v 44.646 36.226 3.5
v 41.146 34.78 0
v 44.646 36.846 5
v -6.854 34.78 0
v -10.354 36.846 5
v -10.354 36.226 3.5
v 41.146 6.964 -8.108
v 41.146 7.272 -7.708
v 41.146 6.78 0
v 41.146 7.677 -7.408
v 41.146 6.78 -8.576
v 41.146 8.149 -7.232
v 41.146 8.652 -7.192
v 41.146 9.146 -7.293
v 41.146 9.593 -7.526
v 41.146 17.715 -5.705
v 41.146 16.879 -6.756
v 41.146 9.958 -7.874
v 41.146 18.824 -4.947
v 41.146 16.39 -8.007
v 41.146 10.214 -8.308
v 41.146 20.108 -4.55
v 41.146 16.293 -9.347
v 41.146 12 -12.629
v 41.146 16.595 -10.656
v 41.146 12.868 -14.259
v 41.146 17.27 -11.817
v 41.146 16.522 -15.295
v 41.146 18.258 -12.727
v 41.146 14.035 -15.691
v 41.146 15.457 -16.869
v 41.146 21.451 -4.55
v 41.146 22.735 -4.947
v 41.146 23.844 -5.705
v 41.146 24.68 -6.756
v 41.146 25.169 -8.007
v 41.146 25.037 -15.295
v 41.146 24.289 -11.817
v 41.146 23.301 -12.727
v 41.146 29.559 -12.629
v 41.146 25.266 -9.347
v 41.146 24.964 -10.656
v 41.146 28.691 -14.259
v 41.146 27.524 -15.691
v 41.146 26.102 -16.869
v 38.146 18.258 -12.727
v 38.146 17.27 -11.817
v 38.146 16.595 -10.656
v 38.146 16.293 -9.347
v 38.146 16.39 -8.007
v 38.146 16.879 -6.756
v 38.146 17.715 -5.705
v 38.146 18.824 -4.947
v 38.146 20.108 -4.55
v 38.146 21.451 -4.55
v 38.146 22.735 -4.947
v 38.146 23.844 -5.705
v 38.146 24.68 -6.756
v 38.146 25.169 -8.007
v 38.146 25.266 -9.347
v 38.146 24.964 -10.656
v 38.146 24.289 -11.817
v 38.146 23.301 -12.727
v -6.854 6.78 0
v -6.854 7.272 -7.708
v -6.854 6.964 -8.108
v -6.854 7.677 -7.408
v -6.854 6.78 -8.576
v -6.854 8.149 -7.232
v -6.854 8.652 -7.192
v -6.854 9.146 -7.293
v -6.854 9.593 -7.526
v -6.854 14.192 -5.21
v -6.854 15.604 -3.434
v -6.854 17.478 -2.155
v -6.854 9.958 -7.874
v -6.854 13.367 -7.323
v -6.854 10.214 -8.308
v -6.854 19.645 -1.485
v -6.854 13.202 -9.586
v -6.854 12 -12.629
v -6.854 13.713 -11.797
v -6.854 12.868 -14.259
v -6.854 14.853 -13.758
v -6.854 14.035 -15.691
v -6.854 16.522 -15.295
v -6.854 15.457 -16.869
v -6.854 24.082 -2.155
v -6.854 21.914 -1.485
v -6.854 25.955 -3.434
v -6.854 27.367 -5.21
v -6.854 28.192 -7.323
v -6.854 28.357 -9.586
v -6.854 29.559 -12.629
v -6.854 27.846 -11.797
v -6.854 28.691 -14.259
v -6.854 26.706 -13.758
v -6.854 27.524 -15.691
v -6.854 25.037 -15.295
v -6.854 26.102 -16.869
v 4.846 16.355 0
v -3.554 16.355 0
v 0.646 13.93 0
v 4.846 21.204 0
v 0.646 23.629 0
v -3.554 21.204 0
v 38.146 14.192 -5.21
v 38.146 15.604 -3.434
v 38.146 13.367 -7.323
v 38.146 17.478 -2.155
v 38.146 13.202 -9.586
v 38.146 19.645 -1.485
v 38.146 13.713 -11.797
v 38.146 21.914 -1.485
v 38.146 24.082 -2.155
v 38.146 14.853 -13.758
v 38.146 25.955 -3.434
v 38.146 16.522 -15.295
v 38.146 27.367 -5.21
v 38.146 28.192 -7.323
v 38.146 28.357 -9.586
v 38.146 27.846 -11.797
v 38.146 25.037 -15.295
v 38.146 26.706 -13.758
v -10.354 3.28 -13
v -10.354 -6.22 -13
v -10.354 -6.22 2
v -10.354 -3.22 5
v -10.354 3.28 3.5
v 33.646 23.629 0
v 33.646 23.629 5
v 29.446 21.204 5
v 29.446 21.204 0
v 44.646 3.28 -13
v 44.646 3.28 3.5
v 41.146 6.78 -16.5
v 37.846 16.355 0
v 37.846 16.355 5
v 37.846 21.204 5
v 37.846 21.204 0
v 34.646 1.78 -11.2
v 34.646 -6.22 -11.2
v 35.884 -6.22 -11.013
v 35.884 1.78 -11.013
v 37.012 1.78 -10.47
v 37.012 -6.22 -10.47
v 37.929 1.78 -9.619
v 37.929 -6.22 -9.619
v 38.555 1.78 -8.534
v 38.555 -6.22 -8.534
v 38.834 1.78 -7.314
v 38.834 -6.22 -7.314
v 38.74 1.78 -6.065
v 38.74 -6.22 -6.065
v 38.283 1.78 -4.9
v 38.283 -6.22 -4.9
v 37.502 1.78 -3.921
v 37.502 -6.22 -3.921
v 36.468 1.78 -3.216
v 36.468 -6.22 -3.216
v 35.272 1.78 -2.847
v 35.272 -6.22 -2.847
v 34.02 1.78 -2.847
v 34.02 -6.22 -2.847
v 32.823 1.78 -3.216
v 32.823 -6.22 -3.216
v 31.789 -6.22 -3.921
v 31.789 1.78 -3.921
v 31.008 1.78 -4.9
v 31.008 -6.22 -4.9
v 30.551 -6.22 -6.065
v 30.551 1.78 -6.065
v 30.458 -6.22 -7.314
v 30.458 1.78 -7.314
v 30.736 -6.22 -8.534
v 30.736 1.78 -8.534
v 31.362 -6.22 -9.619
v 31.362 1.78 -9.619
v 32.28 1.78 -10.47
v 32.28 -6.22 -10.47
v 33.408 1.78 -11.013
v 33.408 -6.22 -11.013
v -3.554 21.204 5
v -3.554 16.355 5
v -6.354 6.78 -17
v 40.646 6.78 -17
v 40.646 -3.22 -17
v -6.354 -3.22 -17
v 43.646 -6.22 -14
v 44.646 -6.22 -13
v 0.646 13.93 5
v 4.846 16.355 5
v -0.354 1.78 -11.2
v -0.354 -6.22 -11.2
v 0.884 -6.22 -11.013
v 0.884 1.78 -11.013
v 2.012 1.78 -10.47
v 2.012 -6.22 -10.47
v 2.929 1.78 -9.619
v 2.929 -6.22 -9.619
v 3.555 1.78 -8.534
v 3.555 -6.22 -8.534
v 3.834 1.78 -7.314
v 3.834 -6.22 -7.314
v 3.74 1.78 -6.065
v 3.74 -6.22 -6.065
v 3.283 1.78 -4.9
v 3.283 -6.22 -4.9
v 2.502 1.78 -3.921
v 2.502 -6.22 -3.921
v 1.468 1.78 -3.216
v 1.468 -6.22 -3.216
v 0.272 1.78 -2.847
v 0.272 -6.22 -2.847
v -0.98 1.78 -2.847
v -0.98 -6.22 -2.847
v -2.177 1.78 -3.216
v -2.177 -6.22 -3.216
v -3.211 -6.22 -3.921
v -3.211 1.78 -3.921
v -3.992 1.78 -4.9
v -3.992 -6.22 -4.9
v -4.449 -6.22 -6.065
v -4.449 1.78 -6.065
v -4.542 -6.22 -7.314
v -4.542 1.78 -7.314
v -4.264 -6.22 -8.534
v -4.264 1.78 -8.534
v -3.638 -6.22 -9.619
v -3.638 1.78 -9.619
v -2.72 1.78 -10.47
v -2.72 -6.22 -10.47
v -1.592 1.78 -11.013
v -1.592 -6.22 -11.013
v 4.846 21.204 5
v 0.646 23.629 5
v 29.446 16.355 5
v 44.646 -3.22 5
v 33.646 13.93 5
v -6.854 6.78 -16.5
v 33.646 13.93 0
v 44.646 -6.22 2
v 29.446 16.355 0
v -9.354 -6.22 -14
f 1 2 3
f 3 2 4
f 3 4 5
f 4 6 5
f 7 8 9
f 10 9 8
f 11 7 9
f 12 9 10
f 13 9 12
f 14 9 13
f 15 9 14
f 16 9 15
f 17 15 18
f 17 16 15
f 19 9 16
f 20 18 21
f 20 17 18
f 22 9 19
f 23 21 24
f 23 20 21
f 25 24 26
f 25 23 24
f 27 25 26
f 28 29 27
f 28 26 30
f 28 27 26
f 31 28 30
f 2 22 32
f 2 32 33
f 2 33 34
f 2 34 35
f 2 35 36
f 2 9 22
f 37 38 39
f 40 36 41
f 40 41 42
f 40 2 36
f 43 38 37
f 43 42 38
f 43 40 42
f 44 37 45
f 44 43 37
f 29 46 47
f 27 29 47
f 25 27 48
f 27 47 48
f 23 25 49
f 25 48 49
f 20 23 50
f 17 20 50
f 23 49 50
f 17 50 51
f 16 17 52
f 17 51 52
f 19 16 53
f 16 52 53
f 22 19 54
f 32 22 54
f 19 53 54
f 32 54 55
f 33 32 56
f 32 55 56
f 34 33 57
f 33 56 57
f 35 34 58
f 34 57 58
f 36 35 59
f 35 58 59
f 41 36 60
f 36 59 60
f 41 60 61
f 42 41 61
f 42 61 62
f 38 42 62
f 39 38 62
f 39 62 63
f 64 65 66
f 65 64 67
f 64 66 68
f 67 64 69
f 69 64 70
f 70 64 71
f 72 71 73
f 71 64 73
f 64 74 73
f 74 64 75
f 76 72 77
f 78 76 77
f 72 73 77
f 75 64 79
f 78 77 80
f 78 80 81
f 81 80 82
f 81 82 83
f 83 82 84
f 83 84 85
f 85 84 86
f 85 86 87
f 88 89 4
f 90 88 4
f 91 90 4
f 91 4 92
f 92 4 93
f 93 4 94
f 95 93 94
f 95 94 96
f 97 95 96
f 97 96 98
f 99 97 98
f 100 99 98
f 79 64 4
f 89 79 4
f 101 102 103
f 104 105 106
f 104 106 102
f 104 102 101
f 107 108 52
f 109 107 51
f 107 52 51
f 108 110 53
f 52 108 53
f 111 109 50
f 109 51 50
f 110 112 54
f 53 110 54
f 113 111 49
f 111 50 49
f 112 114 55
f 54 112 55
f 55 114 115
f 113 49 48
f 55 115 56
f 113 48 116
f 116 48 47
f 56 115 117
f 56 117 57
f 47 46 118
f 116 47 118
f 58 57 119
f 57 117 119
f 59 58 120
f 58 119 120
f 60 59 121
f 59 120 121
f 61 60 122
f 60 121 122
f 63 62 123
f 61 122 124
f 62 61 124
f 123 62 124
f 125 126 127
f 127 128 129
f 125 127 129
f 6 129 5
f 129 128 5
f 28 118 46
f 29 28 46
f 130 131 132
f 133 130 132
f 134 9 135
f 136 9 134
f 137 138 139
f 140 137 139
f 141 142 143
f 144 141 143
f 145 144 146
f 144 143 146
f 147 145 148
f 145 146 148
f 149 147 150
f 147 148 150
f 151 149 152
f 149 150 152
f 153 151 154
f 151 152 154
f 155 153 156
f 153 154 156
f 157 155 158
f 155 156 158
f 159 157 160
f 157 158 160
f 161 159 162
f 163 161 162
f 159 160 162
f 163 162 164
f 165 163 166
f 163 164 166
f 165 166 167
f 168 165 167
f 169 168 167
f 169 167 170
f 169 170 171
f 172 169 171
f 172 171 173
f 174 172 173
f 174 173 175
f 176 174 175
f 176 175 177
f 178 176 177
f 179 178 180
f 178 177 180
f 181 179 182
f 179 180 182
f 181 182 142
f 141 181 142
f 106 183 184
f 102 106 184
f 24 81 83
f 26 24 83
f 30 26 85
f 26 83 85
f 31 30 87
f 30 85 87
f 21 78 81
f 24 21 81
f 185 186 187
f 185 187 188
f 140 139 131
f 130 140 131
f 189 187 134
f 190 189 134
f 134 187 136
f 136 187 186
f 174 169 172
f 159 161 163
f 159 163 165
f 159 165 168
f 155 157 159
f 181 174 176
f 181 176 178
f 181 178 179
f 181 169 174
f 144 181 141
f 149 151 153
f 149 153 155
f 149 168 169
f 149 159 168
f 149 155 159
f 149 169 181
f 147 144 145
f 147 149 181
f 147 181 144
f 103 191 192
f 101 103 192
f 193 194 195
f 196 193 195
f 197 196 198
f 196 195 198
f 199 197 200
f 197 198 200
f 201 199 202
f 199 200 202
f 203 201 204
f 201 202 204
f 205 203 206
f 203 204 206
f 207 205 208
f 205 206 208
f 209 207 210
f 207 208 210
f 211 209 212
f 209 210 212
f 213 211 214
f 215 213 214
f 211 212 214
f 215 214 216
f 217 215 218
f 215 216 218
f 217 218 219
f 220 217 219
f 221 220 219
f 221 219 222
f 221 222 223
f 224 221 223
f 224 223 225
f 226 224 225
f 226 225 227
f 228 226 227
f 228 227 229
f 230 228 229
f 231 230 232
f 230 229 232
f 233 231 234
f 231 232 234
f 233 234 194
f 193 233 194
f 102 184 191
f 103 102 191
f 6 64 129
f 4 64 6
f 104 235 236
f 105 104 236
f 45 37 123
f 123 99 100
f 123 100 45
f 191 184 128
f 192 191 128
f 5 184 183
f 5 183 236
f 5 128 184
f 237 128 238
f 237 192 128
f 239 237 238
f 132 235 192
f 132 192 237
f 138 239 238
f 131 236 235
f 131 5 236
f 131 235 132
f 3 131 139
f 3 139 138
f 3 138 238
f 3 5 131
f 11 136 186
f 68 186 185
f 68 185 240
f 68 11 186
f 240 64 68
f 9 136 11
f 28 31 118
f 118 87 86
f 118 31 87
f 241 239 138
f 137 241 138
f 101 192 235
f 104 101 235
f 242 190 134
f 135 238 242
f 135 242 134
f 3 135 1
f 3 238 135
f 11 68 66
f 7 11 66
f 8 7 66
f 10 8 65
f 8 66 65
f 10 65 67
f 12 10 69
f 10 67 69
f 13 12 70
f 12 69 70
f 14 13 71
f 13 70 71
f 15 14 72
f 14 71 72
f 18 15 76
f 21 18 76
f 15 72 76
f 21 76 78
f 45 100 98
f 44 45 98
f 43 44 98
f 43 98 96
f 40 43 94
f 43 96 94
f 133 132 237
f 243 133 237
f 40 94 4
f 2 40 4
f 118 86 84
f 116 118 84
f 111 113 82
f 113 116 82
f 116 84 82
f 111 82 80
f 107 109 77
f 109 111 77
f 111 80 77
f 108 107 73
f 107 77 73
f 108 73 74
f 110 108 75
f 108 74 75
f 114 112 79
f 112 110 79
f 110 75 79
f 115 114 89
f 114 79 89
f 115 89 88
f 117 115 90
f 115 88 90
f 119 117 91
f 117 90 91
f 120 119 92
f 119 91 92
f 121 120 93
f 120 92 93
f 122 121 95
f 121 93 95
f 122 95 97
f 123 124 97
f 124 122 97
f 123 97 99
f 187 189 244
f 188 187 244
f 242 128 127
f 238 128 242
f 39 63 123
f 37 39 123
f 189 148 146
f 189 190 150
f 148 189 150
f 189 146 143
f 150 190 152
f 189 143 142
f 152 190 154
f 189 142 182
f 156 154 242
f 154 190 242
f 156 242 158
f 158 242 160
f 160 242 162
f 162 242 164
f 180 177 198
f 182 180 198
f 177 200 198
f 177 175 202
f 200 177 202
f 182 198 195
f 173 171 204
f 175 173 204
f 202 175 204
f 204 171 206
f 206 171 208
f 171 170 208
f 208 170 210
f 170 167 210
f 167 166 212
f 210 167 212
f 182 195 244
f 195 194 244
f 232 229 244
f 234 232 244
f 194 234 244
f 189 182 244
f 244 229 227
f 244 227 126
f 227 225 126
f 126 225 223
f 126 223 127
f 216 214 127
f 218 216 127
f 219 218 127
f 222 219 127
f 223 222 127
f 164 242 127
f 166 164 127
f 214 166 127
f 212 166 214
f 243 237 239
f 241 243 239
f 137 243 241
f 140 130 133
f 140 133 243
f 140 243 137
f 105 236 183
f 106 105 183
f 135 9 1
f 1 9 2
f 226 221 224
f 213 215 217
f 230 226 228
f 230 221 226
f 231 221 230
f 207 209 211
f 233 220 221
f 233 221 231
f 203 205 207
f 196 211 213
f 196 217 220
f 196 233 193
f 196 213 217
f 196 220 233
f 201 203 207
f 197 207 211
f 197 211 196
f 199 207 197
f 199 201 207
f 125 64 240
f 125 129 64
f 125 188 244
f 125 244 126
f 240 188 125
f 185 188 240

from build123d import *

# Parameters (mm, degrees)
SKETCH1_W           = 55
SKETCH1_H           = 45
BOSS_EXTRUDE1_DEPTH = 5
SKETCH3_W           = 55
SKETCH3_H           = 13
BOSS_EXTRUDE5_DEPTH = 20
CHAMFER1_SIZE       = 3
SKETCH5_R           = 4.2
CUT_EXTRUDE2_DEPTH  = 8
BOSS_EXTRUDE7_DEPTH = 48
CUT_EXTRUDE3_DEPTH  = 71.205777697
CHAMFER2_SIZE       = 3.5
CHAMFER3_SIZE       = 3.5
CHAMFER4_SIZE       = 7
BOSS_EXTRUDE8_START = -3
BOSS_EXTRUDE8_DEPTH = 3
CHAMFER5_SIZE       = 6
CUT_EXTRUDE4_DEPTH  = 5
SKETCH11_W          = 55
SKETCH11_H          = 13.699454105
CUT_EXTRUDE5_DEPTH  = 3


with BuildPart() as part:
    # Sketch1 → Boss-Extrude1 (new body)
    with BuildSketch(Plane.XY):
        with Locations((17.145774036, 16.279520652)):
            Rectangle(SKETCH1_W, SKETCH1_H)
    extrude(amount=BOSS_EXTRUDE1_DEPTH)

    # Sketch3 → Boss-Extrude5 (add)
    with BuildSketch(Plane(origin=(0, 0, 0), x_dir=(-1, 0, 0), z_dir=(0, 0, -1))):
        with Locations((-17.145774036, 0.279520652)):
            Rectangle(SKETCH3_W, SKETCH3_H)
    extrude(amount=BOSS_EXTRUDE5_DEPTH)

    # Chamfer1
    chamfer1_edges = [part.edges().sort_by_distance(p)[0] for p in [
        (17.145774036, -6.220479348, 5),
    ]]
    chamfer(chamfer1_edges, length=CHAMFER1_SIZE)

    # Sketch5 → Cut-Extrude2 (cut)
    with BuildSketch(Plane.XZ.offset(6.220479348)):
        with Locations(Location((-0.354225964, -7, 0), (0, 0, 270))):
            Circle(SKETCH5_R)
        with Locations(Location((34.645774036, -7, 0), (0, 0, 270))):
            Circle(SKETCH5_R)
    extrude(amount=-CUT_EXTRUDE2_DEPTH, mode=Mode.SUBTRACT)

    # Sketch7 → Boss-Extrude7 (add)
    with BuildSketch(Plane.ZY.offset(6.854225964)):
        with BuildLine():
            Line((-8.308177677, 10.21387745), (-12.629175087, 12.000050953))
            ThreePointArc((-12.629175087, 12.000050953), (-15.003318067, 13.416764905), (-16.86901604, 15.457060078))
            Line((-16.86901604, 15.457060078), (-15.295212832, 16.521552193))
            ThreePointArc((-15.295212832, 16.521552193), (-1.4, 20.779520652), (-15.295212832, 25.037489111))
            Line((-15.295212832, 25.037489111), (-16.86901604, 26.101981226))
            ThreePointArc((-16.86901604, 26.101981226), (-15.003318067, 28.142276398), (-12.629175087, 29.55899035))
            Line((-12.629175087, 29.55899035), (0, 34.779520652))
            Line((0, 34.779520652), (0, 6.779520652))
            Line((0, 6.779520652), (-8.576470695, 6.779520652))
            ThreePointArc((-8.576470695, 6.779520652), (-7.194534972, 8.39922137), (-8.308177677, 10.21387745))
        make_face()
    extrude(amount=-BOSS_EXTRUDE7_DEPTH)

    # Sketch8 → Cut-Extrude3 (cut, through all)
    with BuildSketch(Plane.ZY.offset(10.354225964)):
        Polygon((0, 34.779520652), (5, 36.846373896), (5, 38.779520652), (0, 38.779520652), align=None)
    extrude(amount=-CUT_EXTRUDE3_DEPTH, mode=Mode.SUBTRACT)

    # Chamfer2
    chamfer2_edges = [part.edges().sort_by_distance(p)[0] for p in [
        (-10.354225964, 6.779520652, -10),
        (-10.354225964, 20.779520652, 0),
    ]]
    chamfer(chamfer2_edges, length=CHAMFER2_SIZE - 0.0001)  # a hair under: the kernel refuses the full size

    # Chamfer3
    chamfer3_edges = [part.edges().sort_by_distance(p)[0] for p in [
        (44.645774036, 20.779520652, 0),
        (44.645774036, 6.779520652, -10),
    ]]
    chamfer(chamfer3_edges, length=CHAMFER3_SIZE - 0.0001)  # a hair under: the kernel refuses the full size

    # Chamfer4
    chamfer4_edges = [part.edges().sort_by_distance(p)[0] for p in [
        (44.645774036, -1.470429348, -20),
        (-10.354225964, -1.470429348, -20),
    ]]
    chamfer(chamfer4_edges, length=CHAMFER4_SIZE)

    # Sketch9 → Boss-Extrude8 (add)
    with BuildSketch(Plane(origin=(41.145774036, 0, 0), x_dir=(0, 0, -1), z_dir=(1, 0, 0)).offset(BOSS_EXTRUDE8_START)):
        with BuildLine():
            Line((15.295212832, 16.521552193), (12.727428651, 18.258355117))
            ThreePointArc((12.727428651, 18.258355117), (4.5, 20.779520652), (12.727428651, 23.300686187))
            Line((12.727428651, 23.300686187), (15.295212832, 25.037489111))
            ThreePointArc((15.295212832, 25.037489111), (1.4, 20.779520652), (15.295212832, 16.521552193))
        make_face()
    extrude(amount=BOSS_EXTRUDE8_DEPTH)

    # Chamfer5
    chamfer5_edges = [part.edges().sort_by_distance(p)[0] for p in [
        (17.145774036, -6.220479348, -20),
    ]]
    chamfer(chamfer5_edges, length=CHAMFER5_SIZE)

    # Sketch10 → Cut-Extrude4 (cut)
    with BuildSketch(Plane.XY.offset(5)):
        Polygon((33.645774036, 13.92977839), (37.845774036, 16.354649521), (37.845774036, 21.204391782), (33.645774036, 23.629262913), (29.445774036, 21.204391782), (29.445774036, 16.354649521), align=None)
        Polygon((0.645774036, 13.92977839), (4.845774036, 16.354649521), (4.845774036, 21.204391782), (0.645774036, 23.629262913), (-3.554225964, 21.204391782), (-3.554225964, 16.354649521), align=None)
    extrude(amount=-CUT_EXTRUDE4_DEPTH, mode=Mode.SUBTRACT)

    # Sketch11 → Cut-Extrude5 (cut)
    with BuildSketch(Plane(origin=(0, 0, -20), x_dir=(-1, 0, 0), z_dir=(0, 0, -1))):
        with Locations((-17.145774036, 0.629247705)):
            Rectangle(SKETCH11_W, SKETCH11_H)
    extrude(amount=-CUT_EXTRUDE5_DEPTH, mode=Mode.SUBTRACT)


solid = part.part
